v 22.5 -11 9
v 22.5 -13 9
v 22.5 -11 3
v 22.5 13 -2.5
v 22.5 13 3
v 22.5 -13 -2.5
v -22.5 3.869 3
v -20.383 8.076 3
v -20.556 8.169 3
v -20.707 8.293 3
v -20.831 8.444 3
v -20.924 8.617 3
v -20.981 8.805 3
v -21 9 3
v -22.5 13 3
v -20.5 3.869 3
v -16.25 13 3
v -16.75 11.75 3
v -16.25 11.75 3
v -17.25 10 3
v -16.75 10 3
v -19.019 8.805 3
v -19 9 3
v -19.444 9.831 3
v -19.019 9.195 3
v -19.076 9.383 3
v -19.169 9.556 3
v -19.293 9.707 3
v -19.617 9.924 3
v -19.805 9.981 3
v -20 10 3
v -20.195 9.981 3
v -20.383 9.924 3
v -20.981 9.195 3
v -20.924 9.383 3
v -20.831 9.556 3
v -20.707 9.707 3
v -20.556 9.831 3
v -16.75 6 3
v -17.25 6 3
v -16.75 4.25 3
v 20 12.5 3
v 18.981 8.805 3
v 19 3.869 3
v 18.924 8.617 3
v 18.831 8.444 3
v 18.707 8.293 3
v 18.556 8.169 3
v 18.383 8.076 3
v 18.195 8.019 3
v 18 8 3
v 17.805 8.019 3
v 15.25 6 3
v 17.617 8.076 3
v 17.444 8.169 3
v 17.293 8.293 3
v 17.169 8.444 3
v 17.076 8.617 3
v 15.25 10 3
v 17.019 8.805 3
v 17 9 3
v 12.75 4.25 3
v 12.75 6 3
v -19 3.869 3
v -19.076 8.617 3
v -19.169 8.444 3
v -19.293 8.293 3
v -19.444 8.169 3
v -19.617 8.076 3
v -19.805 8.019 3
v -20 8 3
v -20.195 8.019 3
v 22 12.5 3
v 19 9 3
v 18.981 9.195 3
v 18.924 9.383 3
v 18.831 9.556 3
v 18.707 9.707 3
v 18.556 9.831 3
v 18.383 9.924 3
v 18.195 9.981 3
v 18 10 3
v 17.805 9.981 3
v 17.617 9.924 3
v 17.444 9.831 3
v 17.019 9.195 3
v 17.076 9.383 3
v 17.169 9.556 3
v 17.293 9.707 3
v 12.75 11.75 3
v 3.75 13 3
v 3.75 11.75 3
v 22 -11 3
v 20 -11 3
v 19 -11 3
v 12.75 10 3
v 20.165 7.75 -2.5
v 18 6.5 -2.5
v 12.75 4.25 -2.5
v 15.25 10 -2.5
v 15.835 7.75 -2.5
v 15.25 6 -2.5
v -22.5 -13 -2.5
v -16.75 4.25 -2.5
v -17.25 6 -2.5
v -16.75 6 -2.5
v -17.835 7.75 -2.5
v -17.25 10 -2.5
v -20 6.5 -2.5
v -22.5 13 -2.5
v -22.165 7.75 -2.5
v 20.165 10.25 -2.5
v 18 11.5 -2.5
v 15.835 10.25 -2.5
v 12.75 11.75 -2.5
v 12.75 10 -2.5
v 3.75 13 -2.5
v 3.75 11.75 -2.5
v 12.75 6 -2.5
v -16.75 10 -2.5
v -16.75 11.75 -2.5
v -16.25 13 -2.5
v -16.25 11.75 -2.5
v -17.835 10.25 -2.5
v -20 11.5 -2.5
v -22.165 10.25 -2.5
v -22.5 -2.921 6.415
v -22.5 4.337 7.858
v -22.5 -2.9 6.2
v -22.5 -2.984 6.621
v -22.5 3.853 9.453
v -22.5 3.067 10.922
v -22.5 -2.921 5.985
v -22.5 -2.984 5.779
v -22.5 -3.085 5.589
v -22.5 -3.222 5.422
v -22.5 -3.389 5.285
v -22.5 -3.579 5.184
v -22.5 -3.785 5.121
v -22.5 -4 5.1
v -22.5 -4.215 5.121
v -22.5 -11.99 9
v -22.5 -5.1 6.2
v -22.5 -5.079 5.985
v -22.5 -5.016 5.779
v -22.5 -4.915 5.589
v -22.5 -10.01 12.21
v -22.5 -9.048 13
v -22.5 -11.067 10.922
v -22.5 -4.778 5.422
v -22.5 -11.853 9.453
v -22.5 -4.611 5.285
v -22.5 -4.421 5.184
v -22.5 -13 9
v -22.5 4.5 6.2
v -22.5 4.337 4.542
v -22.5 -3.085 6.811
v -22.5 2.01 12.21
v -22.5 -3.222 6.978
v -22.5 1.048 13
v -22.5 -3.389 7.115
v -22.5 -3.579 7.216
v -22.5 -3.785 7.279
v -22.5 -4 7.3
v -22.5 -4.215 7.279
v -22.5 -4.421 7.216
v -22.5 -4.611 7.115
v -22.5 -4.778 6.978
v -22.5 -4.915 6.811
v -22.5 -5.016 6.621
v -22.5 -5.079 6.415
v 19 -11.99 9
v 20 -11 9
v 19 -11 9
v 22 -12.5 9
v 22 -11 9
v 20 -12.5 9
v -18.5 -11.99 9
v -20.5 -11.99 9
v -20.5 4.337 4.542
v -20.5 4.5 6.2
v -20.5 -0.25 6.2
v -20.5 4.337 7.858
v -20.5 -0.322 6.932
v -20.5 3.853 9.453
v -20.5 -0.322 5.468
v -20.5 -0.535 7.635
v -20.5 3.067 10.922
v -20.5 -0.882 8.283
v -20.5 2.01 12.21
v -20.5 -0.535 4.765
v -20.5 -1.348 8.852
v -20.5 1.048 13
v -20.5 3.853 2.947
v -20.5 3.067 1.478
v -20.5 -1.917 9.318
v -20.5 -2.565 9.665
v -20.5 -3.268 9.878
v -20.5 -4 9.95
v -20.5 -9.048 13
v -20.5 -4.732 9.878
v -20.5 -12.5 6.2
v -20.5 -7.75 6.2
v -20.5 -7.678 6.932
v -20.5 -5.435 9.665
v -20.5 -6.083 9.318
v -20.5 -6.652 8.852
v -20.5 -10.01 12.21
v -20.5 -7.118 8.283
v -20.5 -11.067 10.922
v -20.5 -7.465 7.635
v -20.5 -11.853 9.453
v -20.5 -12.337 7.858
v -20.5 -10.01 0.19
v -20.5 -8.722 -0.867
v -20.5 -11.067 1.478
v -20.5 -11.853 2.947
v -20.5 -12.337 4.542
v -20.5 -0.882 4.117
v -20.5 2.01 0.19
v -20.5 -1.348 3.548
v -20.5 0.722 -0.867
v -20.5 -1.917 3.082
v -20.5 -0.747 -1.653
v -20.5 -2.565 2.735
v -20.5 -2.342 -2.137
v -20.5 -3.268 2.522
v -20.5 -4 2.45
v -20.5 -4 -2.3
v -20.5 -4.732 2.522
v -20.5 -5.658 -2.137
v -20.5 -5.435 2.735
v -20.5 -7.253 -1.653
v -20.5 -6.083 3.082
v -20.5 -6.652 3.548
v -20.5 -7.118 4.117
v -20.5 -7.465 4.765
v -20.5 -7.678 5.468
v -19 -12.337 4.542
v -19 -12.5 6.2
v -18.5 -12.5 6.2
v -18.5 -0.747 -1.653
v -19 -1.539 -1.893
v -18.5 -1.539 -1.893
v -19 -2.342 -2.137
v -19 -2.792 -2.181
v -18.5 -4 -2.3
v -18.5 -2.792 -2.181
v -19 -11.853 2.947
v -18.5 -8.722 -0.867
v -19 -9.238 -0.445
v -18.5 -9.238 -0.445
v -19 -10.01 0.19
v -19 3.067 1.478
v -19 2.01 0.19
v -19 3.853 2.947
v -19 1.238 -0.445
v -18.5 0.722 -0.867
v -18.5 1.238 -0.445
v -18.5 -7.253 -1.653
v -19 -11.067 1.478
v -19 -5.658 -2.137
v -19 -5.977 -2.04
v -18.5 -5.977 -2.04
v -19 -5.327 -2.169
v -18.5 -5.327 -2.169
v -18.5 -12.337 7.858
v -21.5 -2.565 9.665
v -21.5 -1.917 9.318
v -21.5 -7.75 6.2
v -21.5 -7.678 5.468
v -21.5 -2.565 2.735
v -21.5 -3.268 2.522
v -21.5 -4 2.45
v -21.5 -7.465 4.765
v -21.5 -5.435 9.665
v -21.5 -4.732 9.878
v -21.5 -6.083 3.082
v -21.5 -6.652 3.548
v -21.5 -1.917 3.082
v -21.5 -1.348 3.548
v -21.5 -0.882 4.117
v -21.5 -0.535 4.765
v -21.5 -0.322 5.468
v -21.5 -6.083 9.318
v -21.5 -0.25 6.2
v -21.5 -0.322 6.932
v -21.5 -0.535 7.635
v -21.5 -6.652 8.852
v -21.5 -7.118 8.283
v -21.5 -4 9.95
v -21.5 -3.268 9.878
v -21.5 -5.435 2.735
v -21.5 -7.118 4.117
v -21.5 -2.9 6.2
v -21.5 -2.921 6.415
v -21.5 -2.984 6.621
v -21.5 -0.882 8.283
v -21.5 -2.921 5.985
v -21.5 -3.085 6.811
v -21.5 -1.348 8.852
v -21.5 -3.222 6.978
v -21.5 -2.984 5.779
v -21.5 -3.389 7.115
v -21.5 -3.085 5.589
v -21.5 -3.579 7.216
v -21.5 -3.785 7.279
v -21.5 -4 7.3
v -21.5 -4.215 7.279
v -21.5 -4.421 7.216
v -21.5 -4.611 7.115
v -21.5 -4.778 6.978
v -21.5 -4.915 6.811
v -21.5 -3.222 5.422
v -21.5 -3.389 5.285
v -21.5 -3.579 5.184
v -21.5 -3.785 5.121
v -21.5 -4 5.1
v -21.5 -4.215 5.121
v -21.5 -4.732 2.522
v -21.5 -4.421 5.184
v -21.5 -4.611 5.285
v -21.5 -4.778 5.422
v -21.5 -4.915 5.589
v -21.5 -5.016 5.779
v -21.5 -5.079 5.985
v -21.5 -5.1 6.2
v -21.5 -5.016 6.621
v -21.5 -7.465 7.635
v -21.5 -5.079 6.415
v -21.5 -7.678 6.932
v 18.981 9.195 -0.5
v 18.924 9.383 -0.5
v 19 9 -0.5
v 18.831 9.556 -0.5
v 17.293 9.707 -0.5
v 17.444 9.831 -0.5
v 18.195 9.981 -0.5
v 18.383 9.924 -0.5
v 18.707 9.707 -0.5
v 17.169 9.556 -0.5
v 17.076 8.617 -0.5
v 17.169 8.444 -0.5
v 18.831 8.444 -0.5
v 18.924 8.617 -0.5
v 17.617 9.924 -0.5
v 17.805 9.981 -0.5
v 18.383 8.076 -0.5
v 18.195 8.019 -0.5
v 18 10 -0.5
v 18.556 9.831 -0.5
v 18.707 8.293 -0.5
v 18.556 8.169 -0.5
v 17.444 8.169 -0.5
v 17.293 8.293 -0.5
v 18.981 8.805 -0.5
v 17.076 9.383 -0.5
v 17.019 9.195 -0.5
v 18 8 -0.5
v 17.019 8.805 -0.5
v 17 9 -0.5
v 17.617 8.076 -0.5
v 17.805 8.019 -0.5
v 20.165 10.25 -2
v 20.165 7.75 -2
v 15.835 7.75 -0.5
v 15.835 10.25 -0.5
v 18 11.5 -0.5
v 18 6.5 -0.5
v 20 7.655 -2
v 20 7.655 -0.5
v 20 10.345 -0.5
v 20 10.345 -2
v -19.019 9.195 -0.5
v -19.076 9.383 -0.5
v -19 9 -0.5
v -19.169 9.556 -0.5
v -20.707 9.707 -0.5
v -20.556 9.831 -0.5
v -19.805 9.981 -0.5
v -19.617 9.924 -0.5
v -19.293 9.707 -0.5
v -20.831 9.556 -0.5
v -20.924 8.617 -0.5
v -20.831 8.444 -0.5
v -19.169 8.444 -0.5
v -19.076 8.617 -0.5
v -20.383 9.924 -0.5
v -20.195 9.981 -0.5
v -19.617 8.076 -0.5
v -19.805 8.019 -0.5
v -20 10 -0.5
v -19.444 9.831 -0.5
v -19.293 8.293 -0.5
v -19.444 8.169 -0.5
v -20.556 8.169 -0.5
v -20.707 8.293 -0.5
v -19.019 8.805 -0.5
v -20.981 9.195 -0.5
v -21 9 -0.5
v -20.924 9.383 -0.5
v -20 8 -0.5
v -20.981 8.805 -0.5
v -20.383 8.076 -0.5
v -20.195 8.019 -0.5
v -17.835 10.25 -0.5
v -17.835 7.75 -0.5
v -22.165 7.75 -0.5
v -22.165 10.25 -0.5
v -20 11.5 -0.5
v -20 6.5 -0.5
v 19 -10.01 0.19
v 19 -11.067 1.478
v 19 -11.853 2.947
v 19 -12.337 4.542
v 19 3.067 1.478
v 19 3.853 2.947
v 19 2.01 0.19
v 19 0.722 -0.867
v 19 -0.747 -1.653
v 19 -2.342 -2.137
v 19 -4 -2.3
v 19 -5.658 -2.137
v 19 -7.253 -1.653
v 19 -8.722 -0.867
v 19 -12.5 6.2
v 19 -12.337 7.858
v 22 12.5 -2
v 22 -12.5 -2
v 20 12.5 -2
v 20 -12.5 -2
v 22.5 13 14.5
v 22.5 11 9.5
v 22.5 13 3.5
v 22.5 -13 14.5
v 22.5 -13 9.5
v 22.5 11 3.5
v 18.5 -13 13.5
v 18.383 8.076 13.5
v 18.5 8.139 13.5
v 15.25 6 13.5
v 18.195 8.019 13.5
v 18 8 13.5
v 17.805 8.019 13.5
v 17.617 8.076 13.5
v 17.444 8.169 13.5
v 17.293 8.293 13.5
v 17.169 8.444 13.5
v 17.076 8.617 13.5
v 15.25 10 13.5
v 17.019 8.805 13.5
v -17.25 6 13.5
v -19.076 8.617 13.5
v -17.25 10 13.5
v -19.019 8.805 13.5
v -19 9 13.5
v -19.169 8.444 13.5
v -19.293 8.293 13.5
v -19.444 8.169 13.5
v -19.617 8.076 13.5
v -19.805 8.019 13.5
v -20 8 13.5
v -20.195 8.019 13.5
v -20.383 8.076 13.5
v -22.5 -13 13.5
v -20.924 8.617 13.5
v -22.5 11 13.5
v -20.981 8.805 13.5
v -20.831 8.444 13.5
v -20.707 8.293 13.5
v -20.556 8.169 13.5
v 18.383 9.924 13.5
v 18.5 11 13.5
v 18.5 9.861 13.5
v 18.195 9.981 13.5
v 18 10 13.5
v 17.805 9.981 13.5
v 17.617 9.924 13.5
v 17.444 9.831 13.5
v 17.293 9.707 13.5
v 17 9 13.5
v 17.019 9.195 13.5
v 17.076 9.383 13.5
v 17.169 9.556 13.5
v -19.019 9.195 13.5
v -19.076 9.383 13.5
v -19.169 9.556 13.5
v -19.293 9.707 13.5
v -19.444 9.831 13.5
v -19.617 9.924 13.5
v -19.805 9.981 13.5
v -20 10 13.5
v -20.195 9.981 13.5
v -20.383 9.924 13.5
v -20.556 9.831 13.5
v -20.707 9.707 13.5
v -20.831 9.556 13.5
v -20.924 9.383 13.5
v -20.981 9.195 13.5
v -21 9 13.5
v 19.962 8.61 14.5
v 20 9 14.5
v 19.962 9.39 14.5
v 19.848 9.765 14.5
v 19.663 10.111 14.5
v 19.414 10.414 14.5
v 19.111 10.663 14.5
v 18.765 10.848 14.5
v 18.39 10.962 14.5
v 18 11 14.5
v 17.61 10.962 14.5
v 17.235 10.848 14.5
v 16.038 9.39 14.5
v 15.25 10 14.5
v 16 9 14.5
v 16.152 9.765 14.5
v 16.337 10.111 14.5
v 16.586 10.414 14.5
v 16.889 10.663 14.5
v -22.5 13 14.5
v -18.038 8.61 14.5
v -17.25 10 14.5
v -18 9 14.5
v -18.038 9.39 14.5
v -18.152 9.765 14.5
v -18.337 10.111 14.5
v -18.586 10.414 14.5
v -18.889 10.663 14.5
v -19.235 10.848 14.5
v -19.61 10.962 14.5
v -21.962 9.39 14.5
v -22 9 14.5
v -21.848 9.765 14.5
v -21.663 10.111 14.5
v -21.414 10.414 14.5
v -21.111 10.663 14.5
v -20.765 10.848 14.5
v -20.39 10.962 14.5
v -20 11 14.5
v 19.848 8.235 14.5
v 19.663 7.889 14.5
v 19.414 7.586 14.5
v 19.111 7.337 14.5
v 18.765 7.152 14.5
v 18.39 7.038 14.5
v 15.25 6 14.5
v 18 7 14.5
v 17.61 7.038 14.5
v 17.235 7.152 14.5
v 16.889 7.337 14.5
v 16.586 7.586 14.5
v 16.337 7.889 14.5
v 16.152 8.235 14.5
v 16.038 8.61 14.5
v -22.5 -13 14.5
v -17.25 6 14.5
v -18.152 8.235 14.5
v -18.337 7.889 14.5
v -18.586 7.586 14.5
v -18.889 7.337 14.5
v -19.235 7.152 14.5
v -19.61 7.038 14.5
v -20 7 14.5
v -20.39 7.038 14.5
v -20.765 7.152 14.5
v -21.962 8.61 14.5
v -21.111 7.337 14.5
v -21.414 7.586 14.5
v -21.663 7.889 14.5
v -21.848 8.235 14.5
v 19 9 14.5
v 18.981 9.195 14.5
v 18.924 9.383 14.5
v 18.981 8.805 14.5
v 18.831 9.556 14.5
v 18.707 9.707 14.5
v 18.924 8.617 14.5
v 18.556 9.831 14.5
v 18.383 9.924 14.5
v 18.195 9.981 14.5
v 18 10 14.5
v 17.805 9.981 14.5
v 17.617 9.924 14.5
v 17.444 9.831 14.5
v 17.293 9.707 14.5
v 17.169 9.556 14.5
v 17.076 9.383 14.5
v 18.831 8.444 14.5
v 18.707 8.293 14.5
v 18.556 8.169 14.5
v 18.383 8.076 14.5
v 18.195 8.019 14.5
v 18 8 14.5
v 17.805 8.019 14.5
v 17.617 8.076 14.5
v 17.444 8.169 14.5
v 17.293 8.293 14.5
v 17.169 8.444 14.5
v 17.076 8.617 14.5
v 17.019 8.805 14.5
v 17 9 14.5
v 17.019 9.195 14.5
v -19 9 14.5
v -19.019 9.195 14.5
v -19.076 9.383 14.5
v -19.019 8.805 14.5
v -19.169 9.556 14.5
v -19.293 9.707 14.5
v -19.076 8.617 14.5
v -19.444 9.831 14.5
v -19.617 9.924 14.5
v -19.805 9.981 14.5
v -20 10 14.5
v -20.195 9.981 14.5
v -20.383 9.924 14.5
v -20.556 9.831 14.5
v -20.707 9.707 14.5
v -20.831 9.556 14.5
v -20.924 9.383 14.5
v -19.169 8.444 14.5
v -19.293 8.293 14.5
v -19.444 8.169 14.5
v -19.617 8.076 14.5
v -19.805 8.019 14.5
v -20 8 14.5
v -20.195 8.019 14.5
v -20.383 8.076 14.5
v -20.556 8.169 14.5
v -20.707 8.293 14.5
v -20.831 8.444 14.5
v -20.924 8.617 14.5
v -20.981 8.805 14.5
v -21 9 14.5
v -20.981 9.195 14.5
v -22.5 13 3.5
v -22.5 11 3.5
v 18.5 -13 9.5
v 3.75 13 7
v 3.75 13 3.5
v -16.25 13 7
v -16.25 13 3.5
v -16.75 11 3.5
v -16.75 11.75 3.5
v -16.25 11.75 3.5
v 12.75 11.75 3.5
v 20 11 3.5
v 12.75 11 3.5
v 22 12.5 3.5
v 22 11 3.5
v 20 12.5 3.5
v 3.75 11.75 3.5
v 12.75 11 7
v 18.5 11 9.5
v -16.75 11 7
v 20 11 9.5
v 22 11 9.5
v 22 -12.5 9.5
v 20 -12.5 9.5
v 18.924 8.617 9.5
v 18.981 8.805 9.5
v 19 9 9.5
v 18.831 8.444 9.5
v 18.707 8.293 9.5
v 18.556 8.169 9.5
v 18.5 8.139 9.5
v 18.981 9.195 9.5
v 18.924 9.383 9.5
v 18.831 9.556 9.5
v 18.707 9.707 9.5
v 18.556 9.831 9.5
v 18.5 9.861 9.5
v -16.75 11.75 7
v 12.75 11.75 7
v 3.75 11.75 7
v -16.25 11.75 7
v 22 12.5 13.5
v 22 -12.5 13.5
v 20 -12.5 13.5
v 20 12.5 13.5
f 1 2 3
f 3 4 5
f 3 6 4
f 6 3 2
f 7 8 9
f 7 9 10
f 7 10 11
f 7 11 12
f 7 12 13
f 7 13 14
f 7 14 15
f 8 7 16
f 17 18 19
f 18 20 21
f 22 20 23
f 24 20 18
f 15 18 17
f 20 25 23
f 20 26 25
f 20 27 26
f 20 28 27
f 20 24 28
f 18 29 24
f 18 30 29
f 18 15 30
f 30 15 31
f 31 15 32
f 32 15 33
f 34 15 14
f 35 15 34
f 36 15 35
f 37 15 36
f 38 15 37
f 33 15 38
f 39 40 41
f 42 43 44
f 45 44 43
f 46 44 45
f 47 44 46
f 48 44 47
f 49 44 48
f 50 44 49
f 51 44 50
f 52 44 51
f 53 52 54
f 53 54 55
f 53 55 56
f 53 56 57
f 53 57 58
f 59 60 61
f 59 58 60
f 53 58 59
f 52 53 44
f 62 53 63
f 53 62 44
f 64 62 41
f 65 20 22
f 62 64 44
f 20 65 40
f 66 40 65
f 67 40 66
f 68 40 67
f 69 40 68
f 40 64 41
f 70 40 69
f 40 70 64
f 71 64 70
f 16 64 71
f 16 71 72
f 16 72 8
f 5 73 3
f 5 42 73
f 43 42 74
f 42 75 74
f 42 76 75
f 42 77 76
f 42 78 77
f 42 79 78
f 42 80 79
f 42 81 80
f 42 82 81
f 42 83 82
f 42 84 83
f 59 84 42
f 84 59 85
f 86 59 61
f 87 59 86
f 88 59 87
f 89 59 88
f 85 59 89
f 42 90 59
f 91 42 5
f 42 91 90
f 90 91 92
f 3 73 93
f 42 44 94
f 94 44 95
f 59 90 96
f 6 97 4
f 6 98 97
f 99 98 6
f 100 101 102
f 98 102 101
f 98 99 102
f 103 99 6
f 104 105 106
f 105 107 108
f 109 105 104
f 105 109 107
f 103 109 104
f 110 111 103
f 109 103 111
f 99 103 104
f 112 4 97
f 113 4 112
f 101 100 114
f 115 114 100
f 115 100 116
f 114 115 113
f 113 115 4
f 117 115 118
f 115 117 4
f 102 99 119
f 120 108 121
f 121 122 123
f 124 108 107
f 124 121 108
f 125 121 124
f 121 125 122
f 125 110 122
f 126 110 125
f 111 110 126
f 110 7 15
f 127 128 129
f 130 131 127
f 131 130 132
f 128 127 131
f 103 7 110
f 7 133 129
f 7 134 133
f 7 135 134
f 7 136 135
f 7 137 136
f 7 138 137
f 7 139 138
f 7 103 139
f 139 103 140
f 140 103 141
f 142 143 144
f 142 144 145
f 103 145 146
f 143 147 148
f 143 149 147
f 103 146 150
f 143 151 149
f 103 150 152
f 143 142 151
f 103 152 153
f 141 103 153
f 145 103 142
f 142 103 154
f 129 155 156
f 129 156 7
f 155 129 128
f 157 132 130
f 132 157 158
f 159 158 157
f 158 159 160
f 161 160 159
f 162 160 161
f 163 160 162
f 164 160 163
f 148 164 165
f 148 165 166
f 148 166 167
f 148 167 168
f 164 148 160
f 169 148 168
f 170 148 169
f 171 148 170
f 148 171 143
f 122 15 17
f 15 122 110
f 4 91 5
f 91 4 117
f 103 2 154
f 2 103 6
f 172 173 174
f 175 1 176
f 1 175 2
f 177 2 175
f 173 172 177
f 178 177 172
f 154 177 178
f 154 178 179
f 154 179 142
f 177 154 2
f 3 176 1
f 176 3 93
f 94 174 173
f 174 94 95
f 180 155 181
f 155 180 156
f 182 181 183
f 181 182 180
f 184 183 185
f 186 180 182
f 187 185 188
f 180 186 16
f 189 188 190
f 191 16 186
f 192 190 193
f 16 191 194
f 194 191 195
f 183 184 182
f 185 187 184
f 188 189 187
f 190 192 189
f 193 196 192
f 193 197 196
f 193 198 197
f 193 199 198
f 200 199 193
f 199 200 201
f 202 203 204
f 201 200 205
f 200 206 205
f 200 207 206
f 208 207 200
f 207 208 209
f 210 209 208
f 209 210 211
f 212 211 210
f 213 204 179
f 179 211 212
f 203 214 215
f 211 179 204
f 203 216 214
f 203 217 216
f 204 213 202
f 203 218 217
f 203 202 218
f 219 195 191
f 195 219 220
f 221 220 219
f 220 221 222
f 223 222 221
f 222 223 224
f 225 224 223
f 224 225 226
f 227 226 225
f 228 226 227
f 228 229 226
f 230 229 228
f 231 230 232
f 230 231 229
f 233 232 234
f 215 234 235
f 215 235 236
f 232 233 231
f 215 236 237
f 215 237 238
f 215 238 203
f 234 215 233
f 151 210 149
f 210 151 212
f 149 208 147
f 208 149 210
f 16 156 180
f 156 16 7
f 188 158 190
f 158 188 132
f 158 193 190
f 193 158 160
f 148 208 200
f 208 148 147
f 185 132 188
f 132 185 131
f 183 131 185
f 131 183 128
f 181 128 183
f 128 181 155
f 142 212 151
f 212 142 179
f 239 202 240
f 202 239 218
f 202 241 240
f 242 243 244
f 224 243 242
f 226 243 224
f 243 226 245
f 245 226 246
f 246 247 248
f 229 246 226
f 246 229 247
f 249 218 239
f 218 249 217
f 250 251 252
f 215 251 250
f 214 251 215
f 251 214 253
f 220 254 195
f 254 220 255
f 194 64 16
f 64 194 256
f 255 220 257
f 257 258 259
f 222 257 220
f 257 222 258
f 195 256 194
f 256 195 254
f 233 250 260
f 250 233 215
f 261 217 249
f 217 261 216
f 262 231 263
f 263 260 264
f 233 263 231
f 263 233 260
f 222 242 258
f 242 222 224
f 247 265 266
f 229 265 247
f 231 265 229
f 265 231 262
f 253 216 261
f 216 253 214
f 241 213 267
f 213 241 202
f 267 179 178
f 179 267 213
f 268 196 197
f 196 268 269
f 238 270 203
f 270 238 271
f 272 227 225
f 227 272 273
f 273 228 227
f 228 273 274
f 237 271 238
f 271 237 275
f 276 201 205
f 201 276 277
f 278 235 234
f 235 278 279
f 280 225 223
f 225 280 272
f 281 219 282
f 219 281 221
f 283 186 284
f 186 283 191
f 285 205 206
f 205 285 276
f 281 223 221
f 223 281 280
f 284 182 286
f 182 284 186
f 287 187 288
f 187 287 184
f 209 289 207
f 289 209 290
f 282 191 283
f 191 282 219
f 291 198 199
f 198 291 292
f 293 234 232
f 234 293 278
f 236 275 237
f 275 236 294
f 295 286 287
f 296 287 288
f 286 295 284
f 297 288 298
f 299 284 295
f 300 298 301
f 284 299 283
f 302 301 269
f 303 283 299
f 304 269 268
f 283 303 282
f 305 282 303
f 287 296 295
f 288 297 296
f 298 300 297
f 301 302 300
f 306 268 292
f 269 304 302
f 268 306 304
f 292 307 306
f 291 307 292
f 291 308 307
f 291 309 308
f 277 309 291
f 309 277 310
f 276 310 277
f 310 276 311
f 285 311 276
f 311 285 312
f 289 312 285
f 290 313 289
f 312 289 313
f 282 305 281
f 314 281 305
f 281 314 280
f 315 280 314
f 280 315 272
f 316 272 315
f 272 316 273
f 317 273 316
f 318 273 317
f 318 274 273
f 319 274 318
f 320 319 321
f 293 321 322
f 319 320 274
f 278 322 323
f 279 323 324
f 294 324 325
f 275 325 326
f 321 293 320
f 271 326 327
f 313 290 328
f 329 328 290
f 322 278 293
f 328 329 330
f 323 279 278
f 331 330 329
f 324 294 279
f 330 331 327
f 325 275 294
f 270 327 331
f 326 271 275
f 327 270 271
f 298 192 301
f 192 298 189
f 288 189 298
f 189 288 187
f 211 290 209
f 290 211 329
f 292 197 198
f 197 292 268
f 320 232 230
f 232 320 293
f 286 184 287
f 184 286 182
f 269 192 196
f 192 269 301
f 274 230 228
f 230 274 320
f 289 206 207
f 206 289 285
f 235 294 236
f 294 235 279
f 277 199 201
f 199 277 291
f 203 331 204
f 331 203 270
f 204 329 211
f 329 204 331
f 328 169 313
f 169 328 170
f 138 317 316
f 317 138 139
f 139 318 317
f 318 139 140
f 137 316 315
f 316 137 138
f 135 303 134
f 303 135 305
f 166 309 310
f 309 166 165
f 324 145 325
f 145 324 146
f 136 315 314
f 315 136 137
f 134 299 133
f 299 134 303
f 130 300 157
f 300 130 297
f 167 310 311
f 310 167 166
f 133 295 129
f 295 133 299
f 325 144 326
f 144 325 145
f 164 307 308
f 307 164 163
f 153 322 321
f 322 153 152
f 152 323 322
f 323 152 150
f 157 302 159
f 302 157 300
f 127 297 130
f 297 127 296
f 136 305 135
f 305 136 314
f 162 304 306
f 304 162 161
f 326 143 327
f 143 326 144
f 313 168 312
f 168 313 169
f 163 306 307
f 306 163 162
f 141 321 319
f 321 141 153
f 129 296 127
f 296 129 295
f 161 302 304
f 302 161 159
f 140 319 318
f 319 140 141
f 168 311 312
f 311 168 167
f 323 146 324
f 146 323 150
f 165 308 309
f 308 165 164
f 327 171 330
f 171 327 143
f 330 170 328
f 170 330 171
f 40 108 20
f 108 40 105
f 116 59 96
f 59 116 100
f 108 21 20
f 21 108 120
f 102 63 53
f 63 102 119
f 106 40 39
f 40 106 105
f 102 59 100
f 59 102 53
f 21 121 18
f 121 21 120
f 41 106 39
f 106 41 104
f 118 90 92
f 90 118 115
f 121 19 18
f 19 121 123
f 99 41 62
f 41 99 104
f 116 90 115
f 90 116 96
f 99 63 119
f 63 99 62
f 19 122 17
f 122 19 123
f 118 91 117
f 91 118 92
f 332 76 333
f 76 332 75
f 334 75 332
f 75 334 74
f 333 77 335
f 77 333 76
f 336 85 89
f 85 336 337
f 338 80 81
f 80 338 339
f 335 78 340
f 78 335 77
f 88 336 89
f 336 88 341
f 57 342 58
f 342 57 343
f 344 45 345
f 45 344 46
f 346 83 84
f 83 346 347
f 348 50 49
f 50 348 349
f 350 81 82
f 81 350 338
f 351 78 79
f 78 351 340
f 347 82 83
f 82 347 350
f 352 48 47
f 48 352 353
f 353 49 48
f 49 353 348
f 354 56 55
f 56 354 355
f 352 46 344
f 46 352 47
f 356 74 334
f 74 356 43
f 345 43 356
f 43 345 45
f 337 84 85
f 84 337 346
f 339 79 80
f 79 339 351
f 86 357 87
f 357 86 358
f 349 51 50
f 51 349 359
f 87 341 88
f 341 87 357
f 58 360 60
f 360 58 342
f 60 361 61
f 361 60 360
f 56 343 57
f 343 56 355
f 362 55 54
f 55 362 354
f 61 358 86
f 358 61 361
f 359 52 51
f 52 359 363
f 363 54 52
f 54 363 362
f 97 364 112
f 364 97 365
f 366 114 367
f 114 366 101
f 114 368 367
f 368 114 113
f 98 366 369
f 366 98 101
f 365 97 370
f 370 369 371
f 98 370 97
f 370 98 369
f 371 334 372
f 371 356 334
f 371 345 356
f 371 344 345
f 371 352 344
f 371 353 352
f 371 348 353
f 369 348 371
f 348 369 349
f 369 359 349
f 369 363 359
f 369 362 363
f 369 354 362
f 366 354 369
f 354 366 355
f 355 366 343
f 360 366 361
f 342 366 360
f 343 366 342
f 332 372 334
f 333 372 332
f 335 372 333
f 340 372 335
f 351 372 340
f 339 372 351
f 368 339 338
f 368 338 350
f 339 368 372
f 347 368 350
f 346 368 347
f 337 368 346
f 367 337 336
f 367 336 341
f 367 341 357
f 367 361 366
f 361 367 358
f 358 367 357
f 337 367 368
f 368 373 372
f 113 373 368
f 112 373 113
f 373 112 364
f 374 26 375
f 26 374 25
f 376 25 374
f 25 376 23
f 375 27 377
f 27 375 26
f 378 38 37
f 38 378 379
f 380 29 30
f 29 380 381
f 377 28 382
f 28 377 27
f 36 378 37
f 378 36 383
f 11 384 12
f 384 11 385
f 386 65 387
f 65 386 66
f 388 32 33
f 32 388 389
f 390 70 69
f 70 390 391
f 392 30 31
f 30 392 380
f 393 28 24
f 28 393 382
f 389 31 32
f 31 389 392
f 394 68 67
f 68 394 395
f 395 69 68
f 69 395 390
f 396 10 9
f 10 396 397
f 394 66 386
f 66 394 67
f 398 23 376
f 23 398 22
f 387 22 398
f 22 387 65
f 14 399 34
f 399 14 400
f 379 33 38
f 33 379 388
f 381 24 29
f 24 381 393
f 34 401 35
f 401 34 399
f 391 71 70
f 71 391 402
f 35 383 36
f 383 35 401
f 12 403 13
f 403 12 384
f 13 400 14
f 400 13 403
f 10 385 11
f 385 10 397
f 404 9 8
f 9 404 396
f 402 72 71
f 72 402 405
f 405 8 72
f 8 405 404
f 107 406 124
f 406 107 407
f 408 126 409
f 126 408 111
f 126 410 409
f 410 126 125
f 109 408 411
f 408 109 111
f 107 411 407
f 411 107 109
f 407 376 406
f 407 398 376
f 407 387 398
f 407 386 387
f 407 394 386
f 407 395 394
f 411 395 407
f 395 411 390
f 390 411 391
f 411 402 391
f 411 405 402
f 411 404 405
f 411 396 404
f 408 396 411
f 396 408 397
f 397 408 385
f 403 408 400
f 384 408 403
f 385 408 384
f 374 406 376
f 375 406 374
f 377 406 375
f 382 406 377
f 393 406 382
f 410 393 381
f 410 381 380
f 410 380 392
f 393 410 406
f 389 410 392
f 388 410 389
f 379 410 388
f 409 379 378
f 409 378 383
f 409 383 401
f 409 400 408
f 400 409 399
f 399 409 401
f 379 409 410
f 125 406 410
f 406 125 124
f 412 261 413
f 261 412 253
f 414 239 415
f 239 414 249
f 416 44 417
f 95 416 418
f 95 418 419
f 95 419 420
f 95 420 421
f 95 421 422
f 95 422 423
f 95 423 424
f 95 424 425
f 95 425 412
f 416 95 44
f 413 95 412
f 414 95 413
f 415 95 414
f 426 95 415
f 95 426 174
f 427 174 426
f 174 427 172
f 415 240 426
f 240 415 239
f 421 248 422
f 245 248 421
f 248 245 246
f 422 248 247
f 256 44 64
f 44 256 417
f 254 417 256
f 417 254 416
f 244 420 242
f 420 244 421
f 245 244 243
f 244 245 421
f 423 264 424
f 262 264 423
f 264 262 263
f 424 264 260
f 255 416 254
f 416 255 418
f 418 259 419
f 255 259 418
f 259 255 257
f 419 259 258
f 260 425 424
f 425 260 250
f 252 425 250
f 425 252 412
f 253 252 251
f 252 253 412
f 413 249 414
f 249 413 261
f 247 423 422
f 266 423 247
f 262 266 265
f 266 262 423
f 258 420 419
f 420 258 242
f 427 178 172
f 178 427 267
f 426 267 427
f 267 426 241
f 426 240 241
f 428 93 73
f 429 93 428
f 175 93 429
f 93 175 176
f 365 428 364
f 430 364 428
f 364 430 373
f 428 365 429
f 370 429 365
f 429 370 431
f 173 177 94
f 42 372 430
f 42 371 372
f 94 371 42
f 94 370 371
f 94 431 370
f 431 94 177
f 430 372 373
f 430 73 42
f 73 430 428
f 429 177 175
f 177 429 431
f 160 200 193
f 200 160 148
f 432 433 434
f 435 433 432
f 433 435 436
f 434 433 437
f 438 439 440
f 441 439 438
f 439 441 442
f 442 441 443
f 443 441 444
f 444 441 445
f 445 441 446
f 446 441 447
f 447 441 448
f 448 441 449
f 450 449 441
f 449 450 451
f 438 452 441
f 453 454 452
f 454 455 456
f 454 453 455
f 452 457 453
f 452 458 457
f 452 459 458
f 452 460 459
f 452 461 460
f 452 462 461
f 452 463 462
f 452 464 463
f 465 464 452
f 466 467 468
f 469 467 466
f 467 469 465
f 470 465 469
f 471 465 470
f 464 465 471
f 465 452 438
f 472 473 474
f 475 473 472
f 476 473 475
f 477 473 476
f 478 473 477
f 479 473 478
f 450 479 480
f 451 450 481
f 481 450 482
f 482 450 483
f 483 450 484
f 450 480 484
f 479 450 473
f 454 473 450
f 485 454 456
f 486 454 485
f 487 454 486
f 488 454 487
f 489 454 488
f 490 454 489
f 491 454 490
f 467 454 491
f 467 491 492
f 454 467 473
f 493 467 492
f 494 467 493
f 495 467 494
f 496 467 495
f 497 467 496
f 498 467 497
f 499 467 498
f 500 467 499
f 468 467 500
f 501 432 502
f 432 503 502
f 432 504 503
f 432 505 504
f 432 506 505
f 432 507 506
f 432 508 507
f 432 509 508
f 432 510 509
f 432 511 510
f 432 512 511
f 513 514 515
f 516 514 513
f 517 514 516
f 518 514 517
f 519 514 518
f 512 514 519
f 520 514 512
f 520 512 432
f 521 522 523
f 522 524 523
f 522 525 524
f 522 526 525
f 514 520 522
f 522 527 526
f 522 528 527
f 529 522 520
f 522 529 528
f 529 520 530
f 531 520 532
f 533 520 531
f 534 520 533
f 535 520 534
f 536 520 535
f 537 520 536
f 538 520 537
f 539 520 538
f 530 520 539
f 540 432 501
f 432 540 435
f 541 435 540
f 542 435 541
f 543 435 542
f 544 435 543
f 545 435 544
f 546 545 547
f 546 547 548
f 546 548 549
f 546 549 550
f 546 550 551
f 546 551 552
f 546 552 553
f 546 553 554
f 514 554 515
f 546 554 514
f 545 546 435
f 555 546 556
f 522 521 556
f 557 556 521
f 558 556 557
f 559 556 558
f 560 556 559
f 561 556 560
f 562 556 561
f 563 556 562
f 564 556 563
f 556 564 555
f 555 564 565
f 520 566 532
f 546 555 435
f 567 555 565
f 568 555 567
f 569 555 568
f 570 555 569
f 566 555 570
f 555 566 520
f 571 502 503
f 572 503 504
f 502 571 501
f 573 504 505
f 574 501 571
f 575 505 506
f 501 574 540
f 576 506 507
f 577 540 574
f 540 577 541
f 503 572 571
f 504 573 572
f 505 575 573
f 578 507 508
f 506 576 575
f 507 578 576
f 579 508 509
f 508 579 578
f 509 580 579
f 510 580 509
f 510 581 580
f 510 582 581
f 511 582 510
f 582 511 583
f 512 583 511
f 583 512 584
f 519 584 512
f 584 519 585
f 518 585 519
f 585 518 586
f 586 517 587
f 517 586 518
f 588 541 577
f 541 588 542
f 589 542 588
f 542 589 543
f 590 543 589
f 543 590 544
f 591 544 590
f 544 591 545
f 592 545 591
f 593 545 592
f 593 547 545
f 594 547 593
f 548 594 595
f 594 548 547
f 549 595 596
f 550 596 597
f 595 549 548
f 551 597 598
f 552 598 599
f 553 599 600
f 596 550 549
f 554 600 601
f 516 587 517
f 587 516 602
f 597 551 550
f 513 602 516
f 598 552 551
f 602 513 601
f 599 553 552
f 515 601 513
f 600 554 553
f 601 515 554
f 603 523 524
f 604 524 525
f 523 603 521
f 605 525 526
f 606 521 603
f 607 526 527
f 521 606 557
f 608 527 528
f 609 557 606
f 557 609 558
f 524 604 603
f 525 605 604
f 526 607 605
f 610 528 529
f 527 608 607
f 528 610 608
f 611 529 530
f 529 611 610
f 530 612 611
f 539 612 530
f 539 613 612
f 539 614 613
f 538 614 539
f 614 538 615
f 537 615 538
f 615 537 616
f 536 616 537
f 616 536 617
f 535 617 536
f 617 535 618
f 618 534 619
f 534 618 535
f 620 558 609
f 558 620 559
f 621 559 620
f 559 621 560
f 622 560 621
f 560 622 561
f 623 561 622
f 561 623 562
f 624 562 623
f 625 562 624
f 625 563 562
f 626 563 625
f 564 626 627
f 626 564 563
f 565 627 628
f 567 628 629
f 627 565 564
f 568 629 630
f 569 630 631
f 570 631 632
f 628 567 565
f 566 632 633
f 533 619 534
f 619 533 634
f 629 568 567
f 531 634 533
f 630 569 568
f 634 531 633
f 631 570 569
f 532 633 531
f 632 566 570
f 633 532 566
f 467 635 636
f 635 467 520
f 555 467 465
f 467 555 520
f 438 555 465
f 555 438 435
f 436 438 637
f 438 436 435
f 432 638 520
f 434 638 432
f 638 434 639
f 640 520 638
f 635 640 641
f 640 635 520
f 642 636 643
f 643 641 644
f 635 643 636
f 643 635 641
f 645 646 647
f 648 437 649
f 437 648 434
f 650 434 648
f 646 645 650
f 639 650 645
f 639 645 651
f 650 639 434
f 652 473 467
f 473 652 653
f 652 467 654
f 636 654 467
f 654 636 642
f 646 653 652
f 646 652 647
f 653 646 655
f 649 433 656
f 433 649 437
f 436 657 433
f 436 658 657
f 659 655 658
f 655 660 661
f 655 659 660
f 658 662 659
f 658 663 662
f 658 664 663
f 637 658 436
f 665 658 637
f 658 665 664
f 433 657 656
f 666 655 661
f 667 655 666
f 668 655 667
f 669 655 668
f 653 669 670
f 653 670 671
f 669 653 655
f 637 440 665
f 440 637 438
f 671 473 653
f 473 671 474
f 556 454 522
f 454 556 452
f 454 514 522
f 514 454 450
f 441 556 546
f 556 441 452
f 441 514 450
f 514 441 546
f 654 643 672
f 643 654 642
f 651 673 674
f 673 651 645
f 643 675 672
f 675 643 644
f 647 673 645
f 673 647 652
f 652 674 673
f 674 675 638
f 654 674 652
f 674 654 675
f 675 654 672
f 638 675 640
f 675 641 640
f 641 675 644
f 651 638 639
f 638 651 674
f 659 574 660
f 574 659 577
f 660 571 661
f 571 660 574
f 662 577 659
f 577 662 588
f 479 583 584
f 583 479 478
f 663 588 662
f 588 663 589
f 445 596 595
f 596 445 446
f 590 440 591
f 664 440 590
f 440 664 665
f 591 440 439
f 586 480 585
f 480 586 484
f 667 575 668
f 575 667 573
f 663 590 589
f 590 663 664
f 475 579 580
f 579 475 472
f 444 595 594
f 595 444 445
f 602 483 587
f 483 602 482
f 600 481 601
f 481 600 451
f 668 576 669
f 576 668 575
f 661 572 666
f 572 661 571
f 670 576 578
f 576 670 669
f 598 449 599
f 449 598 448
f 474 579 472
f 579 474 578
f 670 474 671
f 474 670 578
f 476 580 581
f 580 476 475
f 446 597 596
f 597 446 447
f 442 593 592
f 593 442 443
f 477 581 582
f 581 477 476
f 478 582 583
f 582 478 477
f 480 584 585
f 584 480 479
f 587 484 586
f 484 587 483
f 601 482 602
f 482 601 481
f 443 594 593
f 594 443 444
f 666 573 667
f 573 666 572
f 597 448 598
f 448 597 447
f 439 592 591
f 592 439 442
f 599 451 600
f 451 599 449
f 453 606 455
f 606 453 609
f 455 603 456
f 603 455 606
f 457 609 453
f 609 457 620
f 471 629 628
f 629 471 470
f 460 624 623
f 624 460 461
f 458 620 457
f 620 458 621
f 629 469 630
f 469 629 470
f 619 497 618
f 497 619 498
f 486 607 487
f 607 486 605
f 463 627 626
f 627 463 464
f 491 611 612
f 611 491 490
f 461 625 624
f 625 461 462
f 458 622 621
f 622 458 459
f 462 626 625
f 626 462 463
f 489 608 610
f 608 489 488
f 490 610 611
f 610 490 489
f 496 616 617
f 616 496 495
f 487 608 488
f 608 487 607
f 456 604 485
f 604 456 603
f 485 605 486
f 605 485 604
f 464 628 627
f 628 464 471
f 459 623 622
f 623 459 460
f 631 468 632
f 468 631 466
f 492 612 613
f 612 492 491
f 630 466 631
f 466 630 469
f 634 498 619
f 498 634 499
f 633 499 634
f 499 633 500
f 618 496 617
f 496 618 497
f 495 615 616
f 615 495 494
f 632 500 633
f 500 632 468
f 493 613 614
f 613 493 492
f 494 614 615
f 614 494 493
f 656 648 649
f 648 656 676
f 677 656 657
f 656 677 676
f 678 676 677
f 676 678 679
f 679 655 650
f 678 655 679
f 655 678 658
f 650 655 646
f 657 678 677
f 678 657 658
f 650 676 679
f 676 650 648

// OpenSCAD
// file: ../libraries/base_components.scad
BC_OPT_LEGSZ = 5;
BC_OPT_ADDSZ = .5;
BC_OPT_POIDIA = 1.5;

// Battery
module Bat18650Half(center = false){
  if(center == false)
    cylinder(38, d = 17);
  else
    translate([0, 0, -38 / 2])
    cylinder(38, d = 17);  
}

// DIP
module DIP8(legsz = BC_OPT_LEGSZ, addsz = BC_OPT_ADDSZ){
  SX = 9.4 + addsz;
  SY = 6.2 + .8 + addsz;
  SZ = 5;
  
  translate([-SX / 2, -SY / 2, 0])
    cube([SX, SY, SZ]);
  
  for(x = [-1.5, -.5, .5, 1.5])
    for(y = [-1, 1])
    translate([x * 2.54, y * 7.62 / 2, -legsz])
    cylinder(legsz + 5, d = BC_OPT_POIDIA);
}

// POI
module BcPoi(x, y, dia = BC_OPT_POIDIA, legsz = BC_OPT_LEGSZ){
  translate([x, y, -legsz])
    cylinder(legsz, d = dia);
}

// Switch
module BcSwitch7x7(pox_x = 0, pos_y = 0){
  for(x = [-2.54 : 5.08 : 2.54])
    for(y = [-1.9 : 1.9 : 1.9])
      BcPoi(x, y);
}

module BcSwitch7x7Full(add = .2, legsz = 3, up = 0, leg_dia = BC_OPT_POIDIA){
  sz = 7 + add;
  
  translate([-sz / 2, -sz / 2, 0])
  cube([sz, sz, sz + up]);
  
  translate([0, 0, -legsz])
  for(x = [-2.54 : 5.08 : 2.54])
    for(y = [-1.9 : 1.9 : 1.9])
      translate([x, y, 0])
      cylinder(legsz, d = leg_dia);
      //Poi(x, y);
}

module BcLed3mm(legsz = BC_OPT_LEGSZ){
  cylinder(5, d = 3);
  cylinder(1, d = 4.0);
  
  for(x = [-1, 1])
    translate([x * 1.27, 0, -leg_sz])
    cylinder(leg_sz, d = 1);
}

module BcLed5mm(legsz = BC_OPT_LEGSZ){
  cylinder(5, d = 5);
  cylinder(1, d = 6.0);
  
  for(x = [-1, 1])
    translate([x * 1.27, 0, -legsz])
    cylinder(legsz, d = 1);
}
// main file
include <../libraries/base_components.scad>
$fn = 32;

// Version 1.1 (11.12.2023)
// Base models

// Version 1.2 (16.12.2023)
// + Logic magnet board
// + Refactory code
// + Closed case

// ToDo:
// Battery door


// Configure
MODE_MAIN_BOARD = 10; // Main Board
MODE_MAIN_BOARD_UP = 11; // Main Board Up
MODE_LOGIC_BOARD = 20; // Logic board
MODE_DRILL_BOARD = 21; // Drill board
MODE_MAGNET_BOARD = 30; // Logic magnet board
// Test
MODE_SHOW_FULL_MAIN = 0; // Show main up & down

// Select mode
MODE = MODE_SHOW_FULL_MAIN; // <-----------

// Select options
HOLE_UP = 0.2; // Move hole to up (mm)
INVERSE_IT = 0; // Inverse logic sheme 180 degrees
HOLES_Y = 6.35 - 1.24; // Holes y +- position

if(MODE == MODE_SHOW_FULL_MAIN)
  ShowFullMain();
else if(MODE == MODE_MAIN_BOARD)
  MainBoard();
else if(MODE == MODE_MAIN_BOARD_UP)
  MainBoardUp();
else if(MODE == MODE_LOGIC_BOARD)
  LogicBoard();
else if(MODE == MODE_DRILL_BOARD)
  LogicBoard(2);
else if(MODE == MODE_MAGNET_BOARD)
  LogicMagnetBoard();

// Defaults
MAIN_BOARD_SZ = [45, 26, 3, 2.5];
MAIN_BOARD_CON_1 = [18, 9];
MAIN_BOARD_CON_2 = [-20, 9];
// Up
//MAIN2_BOARD_SZ = [45, 26, 1];

// Logic
LOGIC_BOARD_SZ = [32, 17, 2, 2];
LOGIC_BOARD_POS = [-5, 8, 6];


// Difference base logic
module BaseLogic(holes_y = HOLES_Y, SDZL = 0){  
  // MC34063
  DIP8(legsz = SDZL);
  
  // Holes
  for(x = [-1.5, -.5, .5, 1.5])
  for(y = [-1, 1])
  translate([x * 2.54, y * holes_y, -SDZL])
  cylinder(5 + 5, d = 1.5);
  
  // Power In
  for(y = [-1, 1])
  translate([-7, y * 2.54, -SDZL])
    cylinder(10, d = 1.5);
  
  // Result
  for(rc = [[0, -1], [0, 1], [1, -1], [1, 1], [.5, -1.5], [.5, 1.5]])
  //for(x = [0, 1])
  //for(y = [-1, 1])
  translate([7 + rc[0] * 2.54, rc[1] * 2.54, -SDZL])
    cylinder(10, d = 1.5);
}

module LogicMagnetBoard(){
  S0 = LOGIC_BOARD_SZ;
  MX = 0;
  SDZL = S0[3] - HOLE_UP;

  difference(){
    // Board
    translate([-S0[0] / 2 + MX, -S0[1] / 2, -S0[3]])
      cube([S0[0], S0[1], S0[2] + S0[3]]);

    // Base logic
    translate([0, 1, 0])
      rotate([0, 0, INVERSE_IT * 180])
      BaseLogic(SDZL = SDZL);

    // Gercon (20x3) 
    translate([-11, -7, 1])
    //scale([1, 1, 10])
    rotate([0, 90, 0])
    #hull(){
      cylinder(22, d = 3.6);
      
      translate([1, 0, 0])
      cylinder(22, d = 3.6);
    }
  }
}

module ShowFullMain(){
  MainBoard();
  
  translate([0, 0, 14.5])
  rotate([180, 0, 0])
  MainBoardUp();
  
  // Crona
  SC0 = [48, 26, 17];
  
  translate([-SC0[0] / 2, -SC0[1] / 2, -2.5])
    %cube(SC0);
}

module MainBoardUp(){
  S0 = MAIN_BOARD_SZ; // Main board
  P0 = MAIN_BOARD_CON_1; // Connection points
  P1 = MAIN_BOARD_CON_2;
  SDZ = S0[3];

  difference(){
    union(){
    // Board
    translate([-S0[0] / 2, -S0[1] / 2, 0])
      cube([S0[0], S0[1], 1]);
      
      // SY wall
      translate([-S0[0] / 2, -S0[1] / 2, 0])
      cube([S0[0], 2, 11]);
      
      // Output wall
      translate([18.5, -S0[1] / 2, 0])
        cube([4, S0[1], 5]);
      
      // Battery wall
      *translate([-22.5, -4, 5 + BUT_UP])
      rotate([0, 90, 0])
      cylinder(2.0, d = 17);
      }
    
    // Crona connector
    translate([20, -25 / 2, 1])
      cube([2, 25, 20]);
    
    // Logic Board
    POS = LOGIC_BOARD_POS;
    //  rotate([90, 0, 180])
    translate([0, 0, 0])
    #translate([POS[0], -POS[1], POS[2]])
      //rotate([-90, 180, 0])
    //rotate([90, 180, 180])
      rotate([-90, 0, 180])
    #LogicBoard(FILL = 1);    
      
    // Connection
    for(p = [P0, P1])
    translate([p[0], -p[1], -2]){
      // Hole
      #cylinder(20, d = 2);
      
      // Bolt
      rotate([0, 0, 90])
      #cylinder(2, d = 4);
    }    
  }
}

module MainBoard(){
  S0 = MAIN_BOARD_SZ; // Main board
  P0 = MAIN_BOARD_CON_1; // Connection points
  P1 = MAIN_BOARD_CON_2;
  
  SDZ = S0[3];
  SDZL = S0[3] - HOLE_UP;
  
  BUT_UP = 1.2;
  
  difference(){
    union(){
      // Board
      translate([-S0[0] / 2, -S0[1] / 2, -S0[3]])
        cube([S0[0], S0[1], S0[2] + S0[3]]);
      
      // SY wall
      translate([-S0[0] / 2, -S0[1] / 2, 0])
      cube([S0[0], 2, 9]);
      
      // Battery wall
      translate([-22.5, -4, 5 + BUT_UP])
      rotate([0, 90, 0])
      cylinder(2.0, d = 17);
      
      *translate([+18, 4, 5 + BUT_UP])
      rotate([0, 90, 0])
      cylinder(3.5, d = 17);
    }
    
    // Battery
    translate([0, -4, 5 + BUT_UP])
    rotate([0, 90, 0])
      Bat18650Half(center = true);
    
    // Battery VCC+
          // Battery wall
      translate([-22.5, -4, 5 + BUT_UP])
      rotate([0, 90, 0]){
          translate([0, 0, 2])
          cylinder(2.0, d = 17);

          translate([0, 0, 1])
          #cylinder(1.0, d = 7.5);

          #cylinder(1.0, d = 2.2);      
      }
    
    // Crona connector
    translate([20, -25 / 2, -2])
    cube([2, 25, 20]);
    
    // Logic Board
    #translate(LOGIC_BOARD_POS)
    rotate([90, 0, 180])
    LogicBoard(FILL = 1);    
      
    // Connection
    for(p = [P0, P1])
    translate([p[0], p[1], -SDZ]){
      // Hole
      #cylinder(20, d = 2);
      
      // Nut
      rotate([0, 0, 90])
      #cylinder(2, d = 5, $fn = 6);
    }
     
   // Clear max height
    translate([-S0[0] / 2, -S0[1] / 2, 13])
      cube([S0[0], S0[1], 3]);
  }
}

module LogicBoard(FILL = 0){
  S0 = LOGIC_BOARD_SZ;
  MX = -4;
  SDZL = S0[3] - HOLE_UP;
  
  SX = S0[0];
  
  SY = S0[1];
  SZ = S0[2];
  SDZ = S0[3];
  //SDZL = SDZ - .2;

  if(FILL == 1){
    FSX = SX + .5;
    FSY = SY + .5;
    BS = 7 + .5;
    
    // Board
    translate([-FSX / 2 + MX, -FSY / 2, -SDZ])
      cube([FSX, FSY, SZ + SDZ]);  
    
    translate([-14, -5, 0])
    translate([-BS / 2, -3.5, -BS / 2])
    cube([BS + 22, 7, BS]);
    
    translate([-14 + 9, -5, 2])
    translate([-BS / 2, -3.5, -BS / 2])
    cube([BS + 12.5, 7, BS]);
  } else if(FILL == 2){
    FSX = SX;// + .5;
    FSY = SY;// + .5;
    BS = 7;// + .5;
    
    difference(){
      union(){
        // Board
        translate([-FSX / 2 + MX, -FSY / 2, -SDZ])
          cube([FSX, FSY - 5, SZ + SDZ]);
        
        translate([-14, -5, 0])
        translate([-BS / 2, -3.75, -BS / 2])
        cube([BS + 22, 7, BS]);
        
        *translate([-14 + 9, -5, 2])
        translate([-BS / 2, -3.75, -BS / 2])
        cube([BS + 12.5, 7, BS]);
      }
      
      // Drill hole 7x7
      translate([-14, 11.5, 0])
        rotate([90, 0, 0]){
          *#cylinder(20, d = 1.5);
          
          #translate([0, 0, +1.0])
          cylinder(20, d = 4);          
        }
        
      // Drill hole led 3mm
      translate([-8, 11.5, 0])
        rotate([90, 0, 0]){
          *#cylinder(20, d = 1.5);
          
          #translate([0, 0, +1])
          cylinder(20, d = 3);          
        }      
    }
  } else

  difference(){
    union(){
    // Board
    translate([-S0[0] / 2 + MX, -S0[1] / 2, -S0[3]])
      cube([S0[0], S0[1], S0[2] + S0[3]]);
      
      // Switch case
      translate([-17.5, -5, 0])
      cube([7, 5.5, 3.5]);
    }
    
    // Base logic
    translate([INVERSE_IT * 6, 0, 0])
    rotate([0, 0, INVERSE_IT * 180])    
      BaseLogic(SDZL = SDZL);
    
    // Switch
    translate([-14, -2, 0])
    rotate([90, 90, 0])
    #BcSwitch7x7Full(legsz = 4);
    
    // + Wire contact
    translate([-14, 3.0, -SDZL])
      cylinder(10, d = 1.5);
    
    // Led
    translate([-7-1, -8, 0])
    rotate([90, 90, 0])
    BcLed3mmMod(legsz = 13);
    
    // Led to Power
    line([-8, -1, SZ - .5], [-12, 3, SZ], .5);
    
    // Led resistor
    *translate([-10, 2.5, -SDZL])
      cylinder(10, d = 1.5);
    // + Body
    translate([-7, 2.5, -SDZL + 1])
      cylinder(10, d = 3);
  }  
}

module BcLed3mmMod(legsz = BC_OPT_LEGSZ){
  cylinder(5, d = 3);
  cylinder(1, d = 4.5);
  
  for(x = [-1, 1]){
    translate([x * 1.27, 0, -legsz - x * 6])
    cylinder(legsz + x * 6, d = 1);
    
    translate([x * 1.27 + x * .5, 0, -legsz -x * 6])
    cylinder(legsz + x * 6, d = 1);  
  }
}

module line(start, end, thickness = 1) {
    hull() {
        translate(start) sphere(thickness);
        translate(end) sphere(thickness);
    }
}
